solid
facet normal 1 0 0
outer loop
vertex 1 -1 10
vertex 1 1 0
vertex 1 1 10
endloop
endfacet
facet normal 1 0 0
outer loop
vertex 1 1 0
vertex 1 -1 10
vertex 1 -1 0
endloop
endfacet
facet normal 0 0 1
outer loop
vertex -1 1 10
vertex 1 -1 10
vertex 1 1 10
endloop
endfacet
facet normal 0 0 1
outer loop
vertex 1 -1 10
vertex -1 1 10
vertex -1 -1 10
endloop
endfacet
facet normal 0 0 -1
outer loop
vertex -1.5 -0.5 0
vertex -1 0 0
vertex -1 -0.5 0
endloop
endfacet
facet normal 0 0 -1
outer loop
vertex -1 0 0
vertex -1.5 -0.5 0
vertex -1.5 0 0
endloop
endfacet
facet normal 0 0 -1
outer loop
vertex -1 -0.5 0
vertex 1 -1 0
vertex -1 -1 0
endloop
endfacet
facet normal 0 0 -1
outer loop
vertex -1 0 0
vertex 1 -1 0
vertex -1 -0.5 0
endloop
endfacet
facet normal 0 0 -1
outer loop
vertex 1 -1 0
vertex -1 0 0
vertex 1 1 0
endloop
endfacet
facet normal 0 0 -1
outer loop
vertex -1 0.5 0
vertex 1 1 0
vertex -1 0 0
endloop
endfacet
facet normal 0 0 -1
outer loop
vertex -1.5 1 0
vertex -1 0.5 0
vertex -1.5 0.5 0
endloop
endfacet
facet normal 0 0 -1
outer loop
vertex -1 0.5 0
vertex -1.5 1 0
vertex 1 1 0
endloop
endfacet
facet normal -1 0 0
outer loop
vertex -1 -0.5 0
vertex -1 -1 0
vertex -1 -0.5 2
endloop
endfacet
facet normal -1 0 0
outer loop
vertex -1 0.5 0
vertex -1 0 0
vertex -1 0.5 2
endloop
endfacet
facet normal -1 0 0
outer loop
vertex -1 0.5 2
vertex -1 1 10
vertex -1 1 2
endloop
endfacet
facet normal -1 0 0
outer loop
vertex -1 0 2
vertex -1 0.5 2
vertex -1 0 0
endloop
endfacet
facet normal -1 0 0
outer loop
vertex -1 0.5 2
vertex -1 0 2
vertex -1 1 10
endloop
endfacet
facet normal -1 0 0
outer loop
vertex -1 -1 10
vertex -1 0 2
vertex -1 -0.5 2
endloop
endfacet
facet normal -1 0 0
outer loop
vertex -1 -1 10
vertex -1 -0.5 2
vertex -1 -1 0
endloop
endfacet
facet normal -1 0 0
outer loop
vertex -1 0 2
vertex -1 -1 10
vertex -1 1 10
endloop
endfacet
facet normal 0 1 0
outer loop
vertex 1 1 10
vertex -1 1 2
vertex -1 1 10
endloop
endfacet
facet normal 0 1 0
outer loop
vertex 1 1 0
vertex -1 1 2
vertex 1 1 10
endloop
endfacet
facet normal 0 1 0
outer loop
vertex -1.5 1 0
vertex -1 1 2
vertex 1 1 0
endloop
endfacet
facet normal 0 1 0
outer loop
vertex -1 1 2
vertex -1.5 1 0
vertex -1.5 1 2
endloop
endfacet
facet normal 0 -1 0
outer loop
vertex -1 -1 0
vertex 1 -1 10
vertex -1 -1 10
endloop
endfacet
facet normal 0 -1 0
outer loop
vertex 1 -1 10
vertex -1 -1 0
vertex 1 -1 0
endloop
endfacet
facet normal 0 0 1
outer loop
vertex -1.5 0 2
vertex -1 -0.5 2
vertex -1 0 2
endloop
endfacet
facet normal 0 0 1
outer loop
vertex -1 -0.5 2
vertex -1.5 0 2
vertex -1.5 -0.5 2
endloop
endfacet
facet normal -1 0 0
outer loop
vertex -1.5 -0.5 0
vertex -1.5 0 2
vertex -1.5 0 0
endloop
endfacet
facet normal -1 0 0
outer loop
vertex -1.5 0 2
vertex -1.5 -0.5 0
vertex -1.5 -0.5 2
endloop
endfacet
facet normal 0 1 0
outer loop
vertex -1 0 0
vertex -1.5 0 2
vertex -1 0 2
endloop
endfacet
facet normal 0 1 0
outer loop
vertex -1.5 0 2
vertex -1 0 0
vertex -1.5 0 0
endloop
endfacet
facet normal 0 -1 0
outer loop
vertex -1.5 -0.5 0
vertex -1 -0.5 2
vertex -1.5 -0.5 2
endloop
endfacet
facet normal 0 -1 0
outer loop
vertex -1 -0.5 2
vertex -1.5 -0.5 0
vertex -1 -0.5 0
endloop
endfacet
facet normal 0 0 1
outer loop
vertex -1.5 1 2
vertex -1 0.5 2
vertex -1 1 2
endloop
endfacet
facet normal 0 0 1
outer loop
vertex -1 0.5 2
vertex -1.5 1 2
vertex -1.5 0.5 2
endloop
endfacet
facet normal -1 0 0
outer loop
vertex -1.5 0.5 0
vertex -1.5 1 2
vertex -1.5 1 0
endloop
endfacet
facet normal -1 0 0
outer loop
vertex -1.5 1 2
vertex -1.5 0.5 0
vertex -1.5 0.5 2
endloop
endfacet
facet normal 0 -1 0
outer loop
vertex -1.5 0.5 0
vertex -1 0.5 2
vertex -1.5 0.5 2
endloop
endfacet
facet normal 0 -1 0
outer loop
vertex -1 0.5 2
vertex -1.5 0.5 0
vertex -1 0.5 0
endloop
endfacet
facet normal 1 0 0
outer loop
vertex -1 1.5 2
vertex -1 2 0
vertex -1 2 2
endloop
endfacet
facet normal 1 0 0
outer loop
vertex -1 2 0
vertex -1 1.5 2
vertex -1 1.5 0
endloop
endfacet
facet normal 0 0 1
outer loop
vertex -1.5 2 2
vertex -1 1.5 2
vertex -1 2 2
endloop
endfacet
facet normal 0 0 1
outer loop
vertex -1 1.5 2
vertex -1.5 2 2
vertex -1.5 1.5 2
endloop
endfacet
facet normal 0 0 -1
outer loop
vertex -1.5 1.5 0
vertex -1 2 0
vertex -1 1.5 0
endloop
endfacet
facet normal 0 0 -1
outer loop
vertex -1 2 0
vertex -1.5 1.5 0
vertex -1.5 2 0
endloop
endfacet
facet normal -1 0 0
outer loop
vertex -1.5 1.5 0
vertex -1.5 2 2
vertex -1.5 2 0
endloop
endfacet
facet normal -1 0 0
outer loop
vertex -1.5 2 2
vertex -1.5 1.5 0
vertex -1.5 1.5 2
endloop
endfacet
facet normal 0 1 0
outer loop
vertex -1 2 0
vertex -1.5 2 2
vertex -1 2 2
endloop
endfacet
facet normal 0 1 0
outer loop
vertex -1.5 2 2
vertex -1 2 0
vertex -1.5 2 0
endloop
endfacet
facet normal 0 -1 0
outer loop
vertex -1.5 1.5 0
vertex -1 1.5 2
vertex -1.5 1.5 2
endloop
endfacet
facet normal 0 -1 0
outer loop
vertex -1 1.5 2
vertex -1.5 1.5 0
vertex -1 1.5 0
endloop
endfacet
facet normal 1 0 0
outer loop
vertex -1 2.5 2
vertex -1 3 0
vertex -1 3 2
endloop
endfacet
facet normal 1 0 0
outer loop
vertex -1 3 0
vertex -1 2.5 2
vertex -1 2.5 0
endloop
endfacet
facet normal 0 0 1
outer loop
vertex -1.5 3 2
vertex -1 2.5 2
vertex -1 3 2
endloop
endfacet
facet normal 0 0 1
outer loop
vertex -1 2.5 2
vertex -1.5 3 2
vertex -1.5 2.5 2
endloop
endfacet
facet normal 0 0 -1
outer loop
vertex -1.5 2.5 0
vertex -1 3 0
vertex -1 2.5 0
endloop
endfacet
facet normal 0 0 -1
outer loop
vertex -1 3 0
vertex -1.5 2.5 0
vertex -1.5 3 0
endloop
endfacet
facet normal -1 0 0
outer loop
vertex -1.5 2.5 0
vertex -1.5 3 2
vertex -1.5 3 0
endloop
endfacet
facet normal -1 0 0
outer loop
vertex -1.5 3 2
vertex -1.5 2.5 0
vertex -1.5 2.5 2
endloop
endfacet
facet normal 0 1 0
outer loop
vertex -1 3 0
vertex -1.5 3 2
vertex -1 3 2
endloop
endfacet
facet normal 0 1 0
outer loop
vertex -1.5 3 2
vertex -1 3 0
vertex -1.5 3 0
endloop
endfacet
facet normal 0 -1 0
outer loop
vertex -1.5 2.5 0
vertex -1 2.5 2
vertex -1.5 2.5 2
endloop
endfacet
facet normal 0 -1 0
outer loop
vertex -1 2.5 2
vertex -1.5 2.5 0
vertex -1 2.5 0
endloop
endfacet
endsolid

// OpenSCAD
translate([0, 0, 5]) color([0,1,0,0.9]) cube([2, 2, 10], center=true);
translate([-1.25, -0.25, 1]) color([1,0,0]) cube([0.5, 0.5, 2], center=true);
translate([-1.25, 0.75, 1]) color([1,0,0]) cube([0.5, 0.5, 2], center=true);
translate([-1.25, 1.75, 1]) color([1,0,0]) cube([0.5, 0.5, 2], center=true);
translate([-1.25, 2.75, 1]) color([1,0,0]) cube([0.5, 0.5, 2], center=true);
